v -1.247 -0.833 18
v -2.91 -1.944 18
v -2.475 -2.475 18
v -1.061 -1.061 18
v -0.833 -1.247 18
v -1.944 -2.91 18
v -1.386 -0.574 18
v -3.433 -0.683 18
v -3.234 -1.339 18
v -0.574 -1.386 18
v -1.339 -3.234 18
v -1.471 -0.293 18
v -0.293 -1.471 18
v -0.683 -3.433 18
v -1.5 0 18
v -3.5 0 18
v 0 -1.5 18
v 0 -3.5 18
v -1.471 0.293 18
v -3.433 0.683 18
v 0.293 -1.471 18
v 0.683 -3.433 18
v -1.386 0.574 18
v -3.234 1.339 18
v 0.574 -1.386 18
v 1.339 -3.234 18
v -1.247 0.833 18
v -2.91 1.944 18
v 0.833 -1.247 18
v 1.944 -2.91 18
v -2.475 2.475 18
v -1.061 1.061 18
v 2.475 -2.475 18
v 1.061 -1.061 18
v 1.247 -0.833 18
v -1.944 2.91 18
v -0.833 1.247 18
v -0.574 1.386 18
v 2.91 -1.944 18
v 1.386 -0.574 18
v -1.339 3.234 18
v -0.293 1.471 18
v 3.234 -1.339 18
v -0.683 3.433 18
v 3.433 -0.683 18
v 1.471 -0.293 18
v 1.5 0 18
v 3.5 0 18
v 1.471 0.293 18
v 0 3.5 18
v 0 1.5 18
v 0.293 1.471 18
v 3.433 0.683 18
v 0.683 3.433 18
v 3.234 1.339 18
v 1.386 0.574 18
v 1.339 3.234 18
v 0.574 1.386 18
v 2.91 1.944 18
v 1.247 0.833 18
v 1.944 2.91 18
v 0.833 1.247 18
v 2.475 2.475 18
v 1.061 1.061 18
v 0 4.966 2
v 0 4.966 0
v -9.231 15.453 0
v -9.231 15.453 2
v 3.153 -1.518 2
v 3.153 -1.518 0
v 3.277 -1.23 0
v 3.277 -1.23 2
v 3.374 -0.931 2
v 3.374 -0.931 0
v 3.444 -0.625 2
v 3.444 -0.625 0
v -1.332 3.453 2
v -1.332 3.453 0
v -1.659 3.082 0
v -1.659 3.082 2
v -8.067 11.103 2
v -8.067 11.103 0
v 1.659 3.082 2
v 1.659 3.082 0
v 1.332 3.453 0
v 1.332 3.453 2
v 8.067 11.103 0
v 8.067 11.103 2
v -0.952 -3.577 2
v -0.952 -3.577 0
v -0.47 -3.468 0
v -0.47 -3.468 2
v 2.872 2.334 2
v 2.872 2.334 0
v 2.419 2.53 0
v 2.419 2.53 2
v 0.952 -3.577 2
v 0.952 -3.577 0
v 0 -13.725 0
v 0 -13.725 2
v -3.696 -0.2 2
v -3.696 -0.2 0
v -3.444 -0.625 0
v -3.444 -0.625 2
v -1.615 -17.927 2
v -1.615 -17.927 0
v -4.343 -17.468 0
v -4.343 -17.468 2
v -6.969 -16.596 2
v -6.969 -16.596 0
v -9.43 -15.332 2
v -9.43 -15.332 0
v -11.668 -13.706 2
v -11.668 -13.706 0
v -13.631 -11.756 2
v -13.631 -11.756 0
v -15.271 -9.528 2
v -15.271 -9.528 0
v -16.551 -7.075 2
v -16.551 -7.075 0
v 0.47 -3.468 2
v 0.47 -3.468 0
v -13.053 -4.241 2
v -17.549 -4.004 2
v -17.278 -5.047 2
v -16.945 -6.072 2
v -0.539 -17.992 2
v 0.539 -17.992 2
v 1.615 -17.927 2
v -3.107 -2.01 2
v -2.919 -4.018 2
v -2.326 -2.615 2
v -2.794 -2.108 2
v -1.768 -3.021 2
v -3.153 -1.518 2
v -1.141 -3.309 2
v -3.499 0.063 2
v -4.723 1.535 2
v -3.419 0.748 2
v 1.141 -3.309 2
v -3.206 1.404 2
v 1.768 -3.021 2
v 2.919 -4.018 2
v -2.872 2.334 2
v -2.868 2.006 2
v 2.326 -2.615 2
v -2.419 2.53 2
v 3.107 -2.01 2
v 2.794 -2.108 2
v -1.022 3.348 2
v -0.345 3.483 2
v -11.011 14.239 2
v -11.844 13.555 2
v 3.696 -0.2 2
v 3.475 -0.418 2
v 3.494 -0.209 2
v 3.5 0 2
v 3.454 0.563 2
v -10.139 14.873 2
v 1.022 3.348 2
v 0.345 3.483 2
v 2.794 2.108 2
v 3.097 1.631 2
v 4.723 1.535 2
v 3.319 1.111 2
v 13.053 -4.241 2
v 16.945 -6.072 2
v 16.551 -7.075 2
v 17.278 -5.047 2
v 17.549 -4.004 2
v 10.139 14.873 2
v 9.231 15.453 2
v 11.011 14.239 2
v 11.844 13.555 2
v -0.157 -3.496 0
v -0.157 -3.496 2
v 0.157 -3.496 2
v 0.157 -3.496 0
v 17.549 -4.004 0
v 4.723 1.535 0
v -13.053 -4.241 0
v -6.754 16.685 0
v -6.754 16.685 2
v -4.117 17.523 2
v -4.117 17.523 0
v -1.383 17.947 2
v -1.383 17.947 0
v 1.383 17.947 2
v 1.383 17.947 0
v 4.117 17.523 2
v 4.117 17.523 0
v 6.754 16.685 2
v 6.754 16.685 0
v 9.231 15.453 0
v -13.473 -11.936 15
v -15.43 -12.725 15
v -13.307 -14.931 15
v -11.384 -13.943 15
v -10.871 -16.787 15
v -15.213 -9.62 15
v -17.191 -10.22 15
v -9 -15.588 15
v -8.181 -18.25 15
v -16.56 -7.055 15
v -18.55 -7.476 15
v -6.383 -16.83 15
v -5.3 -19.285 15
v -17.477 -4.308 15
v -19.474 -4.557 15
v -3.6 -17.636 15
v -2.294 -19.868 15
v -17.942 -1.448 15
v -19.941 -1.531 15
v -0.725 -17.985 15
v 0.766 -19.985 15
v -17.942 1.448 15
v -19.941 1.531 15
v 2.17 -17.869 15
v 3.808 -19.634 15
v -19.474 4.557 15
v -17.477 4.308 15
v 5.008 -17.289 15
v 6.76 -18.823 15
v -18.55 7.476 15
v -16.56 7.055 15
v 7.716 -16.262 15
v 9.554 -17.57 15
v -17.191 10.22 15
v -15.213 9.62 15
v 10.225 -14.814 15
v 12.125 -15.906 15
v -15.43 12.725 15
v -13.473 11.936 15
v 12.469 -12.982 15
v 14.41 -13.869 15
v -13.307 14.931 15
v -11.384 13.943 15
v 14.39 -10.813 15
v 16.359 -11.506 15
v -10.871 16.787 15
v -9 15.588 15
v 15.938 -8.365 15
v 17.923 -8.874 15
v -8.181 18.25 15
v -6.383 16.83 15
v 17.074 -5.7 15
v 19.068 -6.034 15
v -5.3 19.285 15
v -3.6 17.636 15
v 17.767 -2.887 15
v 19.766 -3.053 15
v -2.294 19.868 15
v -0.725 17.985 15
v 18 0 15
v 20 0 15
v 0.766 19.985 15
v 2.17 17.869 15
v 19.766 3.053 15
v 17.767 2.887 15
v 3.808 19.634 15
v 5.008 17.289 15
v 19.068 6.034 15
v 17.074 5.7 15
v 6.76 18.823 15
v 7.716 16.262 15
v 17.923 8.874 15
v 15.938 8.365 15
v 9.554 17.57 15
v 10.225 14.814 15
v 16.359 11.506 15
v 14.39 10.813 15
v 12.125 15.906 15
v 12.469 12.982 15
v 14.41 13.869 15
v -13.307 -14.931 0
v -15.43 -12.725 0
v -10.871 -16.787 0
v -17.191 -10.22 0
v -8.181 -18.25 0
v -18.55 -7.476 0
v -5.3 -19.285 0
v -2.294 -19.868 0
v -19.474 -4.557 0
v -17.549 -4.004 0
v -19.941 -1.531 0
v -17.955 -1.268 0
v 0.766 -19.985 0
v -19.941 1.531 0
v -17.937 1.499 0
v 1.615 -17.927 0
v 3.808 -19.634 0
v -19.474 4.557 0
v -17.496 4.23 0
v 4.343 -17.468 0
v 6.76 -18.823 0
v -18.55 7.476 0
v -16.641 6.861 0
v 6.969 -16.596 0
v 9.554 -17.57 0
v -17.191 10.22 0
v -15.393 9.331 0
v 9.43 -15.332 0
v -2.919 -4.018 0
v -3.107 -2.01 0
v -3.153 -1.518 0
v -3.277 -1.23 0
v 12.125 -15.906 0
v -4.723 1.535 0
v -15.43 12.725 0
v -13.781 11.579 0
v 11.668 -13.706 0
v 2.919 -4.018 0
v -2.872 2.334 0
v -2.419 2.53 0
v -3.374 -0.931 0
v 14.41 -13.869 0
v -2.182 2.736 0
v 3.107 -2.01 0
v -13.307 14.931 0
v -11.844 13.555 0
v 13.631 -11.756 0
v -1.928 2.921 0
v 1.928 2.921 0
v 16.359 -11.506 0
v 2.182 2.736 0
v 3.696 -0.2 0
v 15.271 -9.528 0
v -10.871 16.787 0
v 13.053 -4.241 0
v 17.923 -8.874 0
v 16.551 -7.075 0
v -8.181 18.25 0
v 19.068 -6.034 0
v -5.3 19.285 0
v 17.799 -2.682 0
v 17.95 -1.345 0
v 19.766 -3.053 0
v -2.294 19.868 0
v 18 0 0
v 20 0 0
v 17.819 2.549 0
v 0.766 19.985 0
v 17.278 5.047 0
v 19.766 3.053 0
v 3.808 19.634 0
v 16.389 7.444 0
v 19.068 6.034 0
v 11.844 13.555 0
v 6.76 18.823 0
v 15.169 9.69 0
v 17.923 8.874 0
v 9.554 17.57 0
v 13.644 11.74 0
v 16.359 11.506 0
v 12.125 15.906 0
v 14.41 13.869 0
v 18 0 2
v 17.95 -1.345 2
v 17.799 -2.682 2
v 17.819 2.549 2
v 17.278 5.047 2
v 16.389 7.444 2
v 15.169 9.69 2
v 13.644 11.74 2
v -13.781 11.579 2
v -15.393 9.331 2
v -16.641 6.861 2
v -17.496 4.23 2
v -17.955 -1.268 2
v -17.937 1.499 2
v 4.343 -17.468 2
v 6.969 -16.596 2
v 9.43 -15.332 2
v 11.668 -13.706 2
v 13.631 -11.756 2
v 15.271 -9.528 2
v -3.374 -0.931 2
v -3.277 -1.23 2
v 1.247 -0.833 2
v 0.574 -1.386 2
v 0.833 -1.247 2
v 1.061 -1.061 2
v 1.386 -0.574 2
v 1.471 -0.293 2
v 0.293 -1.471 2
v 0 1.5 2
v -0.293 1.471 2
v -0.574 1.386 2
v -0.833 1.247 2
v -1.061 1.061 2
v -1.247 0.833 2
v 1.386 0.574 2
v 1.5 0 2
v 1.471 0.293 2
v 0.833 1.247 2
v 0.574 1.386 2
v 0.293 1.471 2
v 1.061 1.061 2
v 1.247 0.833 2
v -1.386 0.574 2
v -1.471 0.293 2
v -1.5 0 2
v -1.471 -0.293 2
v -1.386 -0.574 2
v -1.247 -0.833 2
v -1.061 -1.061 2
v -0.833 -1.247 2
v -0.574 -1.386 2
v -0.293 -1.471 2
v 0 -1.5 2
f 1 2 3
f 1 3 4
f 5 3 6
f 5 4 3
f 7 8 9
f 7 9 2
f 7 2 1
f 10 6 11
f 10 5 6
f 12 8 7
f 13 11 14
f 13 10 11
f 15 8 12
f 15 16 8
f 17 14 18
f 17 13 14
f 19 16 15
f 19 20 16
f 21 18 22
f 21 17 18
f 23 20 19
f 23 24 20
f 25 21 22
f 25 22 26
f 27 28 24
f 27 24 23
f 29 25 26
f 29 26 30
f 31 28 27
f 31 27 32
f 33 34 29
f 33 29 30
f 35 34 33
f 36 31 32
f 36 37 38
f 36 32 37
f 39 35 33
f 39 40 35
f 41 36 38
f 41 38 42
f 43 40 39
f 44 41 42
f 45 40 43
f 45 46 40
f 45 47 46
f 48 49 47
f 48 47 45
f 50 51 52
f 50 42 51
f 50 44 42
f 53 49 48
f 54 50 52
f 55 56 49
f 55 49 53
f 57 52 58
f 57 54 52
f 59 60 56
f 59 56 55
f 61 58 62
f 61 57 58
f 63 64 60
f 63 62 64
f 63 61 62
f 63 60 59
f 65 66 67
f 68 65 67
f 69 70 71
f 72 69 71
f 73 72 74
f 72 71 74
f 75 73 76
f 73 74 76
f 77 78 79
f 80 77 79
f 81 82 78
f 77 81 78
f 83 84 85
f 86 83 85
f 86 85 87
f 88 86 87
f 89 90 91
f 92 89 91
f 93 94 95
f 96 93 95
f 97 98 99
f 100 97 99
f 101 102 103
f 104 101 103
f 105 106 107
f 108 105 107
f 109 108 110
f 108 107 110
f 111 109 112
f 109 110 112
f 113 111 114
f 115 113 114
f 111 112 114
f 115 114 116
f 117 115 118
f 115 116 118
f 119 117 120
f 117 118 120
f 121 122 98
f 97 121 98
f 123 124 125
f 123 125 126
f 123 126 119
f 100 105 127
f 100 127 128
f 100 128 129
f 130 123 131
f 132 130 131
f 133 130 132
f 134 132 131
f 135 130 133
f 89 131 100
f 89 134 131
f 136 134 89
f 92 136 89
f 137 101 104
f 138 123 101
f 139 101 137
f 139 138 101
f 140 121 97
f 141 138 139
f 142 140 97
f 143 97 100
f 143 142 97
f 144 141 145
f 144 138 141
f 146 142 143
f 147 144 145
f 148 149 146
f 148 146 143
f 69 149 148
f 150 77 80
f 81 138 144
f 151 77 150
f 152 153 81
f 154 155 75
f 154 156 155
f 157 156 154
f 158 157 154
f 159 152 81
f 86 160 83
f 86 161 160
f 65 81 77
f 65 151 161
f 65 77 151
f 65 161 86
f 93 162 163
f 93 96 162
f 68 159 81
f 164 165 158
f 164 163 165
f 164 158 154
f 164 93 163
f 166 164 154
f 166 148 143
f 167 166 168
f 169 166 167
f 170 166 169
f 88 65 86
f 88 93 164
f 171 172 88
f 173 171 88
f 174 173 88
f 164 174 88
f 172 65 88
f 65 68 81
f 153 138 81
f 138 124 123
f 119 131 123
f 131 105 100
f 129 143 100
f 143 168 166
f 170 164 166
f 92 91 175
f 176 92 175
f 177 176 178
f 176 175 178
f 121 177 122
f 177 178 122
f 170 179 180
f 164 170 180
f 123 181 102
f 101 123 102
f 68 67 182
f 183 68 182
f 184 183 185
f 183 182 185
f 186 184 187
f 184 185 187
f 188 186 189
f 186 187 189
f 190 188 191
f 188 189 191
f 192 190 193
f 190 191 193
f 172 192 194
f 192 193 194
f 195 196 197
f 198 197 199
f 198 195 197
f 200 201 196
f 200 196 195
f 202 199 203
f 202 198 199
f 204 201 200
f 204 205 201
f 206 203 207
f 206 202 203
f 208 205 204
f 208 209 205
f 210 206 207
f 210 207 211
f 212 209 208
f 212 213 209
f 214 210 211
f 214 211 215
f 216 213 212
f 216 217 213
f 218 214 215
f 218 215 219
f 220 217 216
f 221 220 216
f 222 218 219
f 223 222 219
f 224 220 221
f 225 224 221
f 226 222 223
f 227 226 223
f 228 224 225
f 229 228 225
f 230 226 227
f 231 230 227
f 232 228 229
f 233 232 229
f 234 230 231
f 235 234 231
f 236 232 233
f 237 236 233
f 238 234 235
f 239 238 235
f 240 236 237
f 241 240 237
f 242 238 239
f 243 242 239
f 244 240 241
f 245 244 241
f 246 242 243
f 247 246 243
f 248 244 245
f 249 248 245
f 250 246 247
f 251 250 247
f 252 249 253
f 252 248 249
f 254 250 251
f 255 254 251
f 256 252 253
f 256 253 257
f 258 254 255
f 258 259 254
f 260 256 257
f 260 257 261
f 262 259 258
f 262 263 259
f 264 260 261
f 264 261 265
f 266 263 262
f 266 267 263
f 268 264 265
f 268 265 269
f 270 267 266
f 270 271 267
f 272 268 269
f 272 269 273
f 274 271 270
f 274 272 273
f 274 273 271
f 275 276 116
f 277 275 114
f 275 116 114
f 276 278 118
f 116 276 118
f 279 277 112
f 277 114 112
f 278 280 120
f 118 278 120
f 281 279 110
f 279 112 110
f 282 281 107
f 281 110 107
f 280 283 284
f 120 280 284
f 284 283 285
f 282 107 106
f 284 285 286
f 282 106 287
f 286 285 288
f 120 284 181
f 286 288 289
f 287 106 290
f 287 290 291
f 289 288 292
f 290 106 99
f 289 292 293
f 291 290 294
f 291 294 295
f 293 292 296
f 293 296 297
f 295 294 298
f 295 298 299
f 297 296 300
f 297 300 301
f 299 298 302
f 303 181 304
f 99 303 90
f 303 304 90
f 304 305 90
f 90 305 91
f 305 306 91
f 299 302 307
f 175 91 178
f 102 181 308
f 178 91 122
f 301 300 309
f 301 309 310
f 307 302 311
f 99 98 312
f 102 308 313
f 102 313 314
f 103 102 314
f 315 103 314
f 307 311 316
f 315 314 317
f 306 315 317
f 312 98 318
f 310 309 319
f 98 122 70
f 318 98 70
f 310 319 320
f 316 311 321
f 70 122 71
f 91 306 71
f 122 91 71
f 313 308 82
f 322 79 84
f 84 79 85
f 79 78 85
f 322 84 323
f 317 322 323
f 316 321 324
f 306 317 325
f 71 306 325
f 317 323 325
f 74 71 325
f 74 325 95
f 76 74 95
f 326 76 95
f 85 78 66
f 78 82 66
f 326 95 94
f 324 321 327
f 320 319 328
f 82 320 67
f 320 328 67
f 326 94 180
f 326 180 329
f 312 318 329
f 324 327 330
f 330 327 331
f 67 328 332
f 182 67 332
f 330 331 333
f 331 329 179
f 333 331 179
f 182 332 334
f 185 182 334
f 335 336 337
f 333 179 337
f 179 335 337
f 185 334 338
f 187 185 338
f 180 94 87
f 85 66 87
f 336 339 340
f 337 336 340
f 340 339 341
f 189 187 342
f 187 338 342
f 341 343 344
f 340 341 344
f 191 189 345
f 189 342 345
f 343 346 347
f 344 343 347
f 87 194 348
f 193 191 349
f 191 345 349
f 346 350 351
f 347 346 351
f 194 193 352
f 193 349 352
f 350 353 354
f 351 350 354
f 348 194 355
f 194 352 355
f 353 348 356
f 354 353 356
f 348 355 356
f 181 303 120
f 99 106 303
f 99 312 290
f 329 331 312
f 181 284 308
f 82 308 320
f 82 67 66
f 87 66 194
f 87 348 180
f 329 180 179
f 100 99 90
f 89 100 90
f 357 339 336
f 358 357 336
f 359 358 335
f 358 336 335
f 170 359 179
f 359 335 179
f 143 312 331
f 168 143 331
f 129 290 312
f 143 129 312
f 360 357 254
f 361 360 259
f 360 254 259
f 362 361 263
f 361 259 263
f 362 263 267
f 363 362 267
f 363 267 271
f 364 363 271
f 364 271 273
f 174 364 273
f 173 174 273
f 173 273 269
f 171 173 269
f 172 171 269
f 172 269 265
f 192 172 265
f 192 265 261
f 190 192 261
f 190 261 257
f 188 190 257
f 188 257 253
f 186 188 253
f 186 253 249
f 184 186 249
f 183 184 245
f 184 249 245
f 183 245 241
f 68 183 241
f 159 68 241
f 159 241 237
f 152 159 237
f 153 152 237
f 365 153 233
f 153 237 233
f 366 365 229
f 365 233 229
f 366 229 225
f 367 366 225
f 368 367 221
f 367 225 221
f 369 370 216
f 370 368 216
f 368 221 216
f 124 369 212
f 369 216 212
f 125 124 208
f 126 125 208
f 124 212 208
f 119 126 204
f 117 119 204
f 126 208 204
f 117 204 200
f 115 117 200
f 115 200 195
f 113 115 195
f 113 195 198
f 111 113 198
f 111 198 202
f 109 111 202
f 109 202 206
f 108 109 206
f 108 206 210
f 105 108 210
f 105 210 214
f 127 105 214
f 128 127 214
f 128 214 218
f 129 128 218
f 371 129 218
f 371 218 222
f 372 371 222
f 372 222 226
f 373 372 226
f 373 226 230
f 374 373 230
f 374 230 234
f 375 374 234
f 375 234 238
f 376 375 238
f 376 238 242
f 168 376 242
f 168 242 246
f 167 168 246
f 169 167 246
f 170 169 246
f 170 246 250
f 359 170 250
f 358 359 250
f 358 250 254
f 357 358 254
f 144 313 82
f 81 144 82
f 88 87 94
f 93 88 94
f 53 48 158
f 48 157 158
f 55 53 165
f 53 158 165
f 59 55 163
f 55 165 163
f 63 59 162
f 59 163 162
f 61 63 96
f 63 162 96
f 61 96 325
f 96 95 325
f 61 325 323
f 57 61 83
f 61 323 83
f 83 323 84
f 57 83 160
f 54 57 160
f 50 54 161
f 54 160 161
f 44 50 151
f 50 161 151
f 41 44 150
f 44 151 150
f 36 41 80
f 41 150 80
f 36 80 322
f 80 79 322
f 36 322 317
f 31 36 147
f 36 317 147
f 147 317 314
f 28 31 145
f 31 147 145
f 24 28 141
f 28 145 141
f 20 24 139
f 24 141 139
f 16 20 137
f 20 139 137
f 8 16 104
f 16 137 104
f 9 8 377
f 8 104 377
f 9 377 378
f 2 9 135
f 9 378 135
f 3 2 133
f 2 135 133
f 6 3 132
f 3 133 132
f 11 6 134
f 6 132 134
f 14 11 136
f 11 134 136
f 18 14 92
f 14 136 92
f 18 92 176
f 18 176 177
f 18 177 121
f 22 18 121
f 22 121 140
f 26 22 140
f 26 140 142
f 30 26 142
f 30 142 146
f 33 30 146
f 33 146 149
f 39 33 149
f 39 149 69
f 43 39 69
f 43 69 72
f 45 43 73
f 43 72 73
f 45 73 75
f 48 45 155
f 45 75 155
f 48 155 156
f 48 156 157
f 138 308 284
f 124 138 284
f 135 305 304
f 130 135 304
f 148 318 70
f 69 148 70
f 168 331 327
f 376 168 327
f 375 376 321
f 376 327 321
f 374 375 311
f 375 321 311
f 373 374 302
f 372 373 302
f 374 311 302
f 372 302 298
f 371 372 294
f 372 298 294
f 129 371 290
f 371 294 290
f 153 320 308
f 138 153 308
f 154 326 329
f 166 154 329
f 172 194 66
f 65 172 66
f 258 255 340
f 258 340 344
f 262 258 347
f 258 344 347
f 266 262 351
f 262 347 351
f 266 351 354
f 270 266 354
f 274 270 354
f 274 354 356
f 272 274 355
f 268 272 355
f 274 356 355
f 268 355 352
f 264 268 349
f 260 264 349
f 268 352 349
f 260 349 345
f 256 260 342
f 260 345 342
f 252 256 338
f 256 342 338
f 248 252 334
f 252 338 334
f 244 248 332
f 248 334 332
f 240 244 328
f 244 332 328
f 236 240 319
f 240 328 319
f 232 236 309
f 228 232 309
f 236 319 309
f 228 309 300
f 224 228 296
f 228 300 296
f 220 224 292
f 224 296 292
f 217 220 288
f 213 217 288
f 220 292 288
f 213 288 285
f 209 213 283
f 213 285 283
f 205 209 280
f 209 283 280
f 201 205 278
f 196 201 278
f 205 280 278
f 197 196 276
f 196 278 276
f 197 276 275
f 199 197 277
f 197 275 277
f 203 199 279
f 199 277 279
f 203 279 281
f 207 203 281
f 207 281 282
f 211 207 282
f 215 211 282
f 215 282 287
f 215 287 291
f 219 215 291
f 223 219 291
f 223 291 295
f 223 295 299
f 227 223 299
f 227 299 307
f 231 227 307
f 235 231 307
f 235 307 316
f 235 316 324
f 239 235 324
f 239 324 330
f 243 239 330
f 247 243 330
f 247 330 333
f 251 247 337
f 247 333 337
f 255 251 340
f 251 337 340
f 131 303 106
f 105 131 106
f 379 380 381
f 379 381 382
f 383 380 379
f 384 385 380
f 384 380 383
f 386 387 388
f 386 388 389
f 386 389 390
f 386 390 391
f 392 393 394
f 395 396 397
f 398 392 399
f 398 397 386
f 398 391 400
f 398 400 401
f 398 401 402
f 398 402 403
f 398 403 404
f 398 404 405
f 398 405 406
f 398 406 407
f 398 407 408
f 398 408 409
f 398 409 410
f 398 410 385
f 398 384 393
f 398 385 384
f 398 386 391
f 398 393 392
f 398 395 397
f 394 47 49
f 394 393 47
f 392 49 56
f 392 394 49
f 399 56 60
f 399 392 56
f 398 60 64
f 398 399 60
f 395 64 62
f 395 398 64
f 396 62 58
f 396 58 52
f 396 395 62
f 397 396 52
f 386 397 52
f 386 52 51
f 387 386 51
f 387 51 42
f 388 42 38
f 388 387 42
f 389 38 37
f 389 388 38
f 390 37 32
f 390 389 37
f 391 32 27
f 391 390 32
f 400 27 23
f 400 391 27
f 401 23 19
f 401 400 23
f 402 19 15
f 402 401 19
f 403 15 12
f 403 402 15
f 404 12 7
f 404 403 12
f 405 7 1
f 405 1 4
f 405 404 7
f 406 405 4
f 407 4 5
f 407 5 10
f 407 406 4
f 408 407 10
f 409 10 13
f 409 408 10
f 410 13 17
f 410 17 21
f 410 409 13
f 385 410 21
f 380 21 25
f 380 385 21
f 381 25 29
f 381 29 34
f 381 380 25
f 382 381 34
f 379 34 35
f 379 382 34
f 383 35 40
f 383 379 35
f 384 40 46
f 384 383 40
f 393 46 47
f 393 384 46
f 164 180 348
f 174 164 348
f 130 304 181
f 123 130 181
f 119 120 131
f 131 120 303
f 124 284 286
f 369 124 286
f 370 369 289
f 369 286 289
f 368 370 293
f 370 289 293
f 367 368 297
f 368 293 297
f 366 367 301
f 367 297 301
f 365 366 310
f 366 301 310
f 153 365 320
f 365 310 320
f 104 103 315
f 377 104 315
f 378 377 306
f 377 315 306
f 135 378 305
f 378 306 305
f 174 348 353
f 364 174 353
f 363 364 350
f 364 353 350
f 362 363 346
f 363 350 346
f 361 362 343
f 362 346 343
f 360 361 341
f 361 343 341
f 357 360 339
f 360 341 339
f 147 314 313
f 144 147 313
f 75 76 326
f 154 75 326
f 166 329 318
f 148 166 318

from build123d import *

# Parameters (mm, degrees)
F0_R      = 20
F1_DEPTH  = 15
F2_R      = 18
F3_DEPTH  = 13
F4_R      = 3.5
F4_R_2    = 1.5
F5_DEPTH  = 13
F6_R      = 3.5
F6_R_2    = 1.5
F7_DEPTH  = 3
F10_DEPTH = 2


with BuildPart() as f1:
    # F0 (on Top) → F1 (new body)
    with BuildSketch(Plane.XY):
        Circle(F0_R)
    extrude(amount=F1_DEPTH)

    # F2 (on face) → F3 (cut)
    with BuildSketch(Plane.XY.offset(15)):
        Circle(F2_R)
    extrude(amount=-F3_DEPTH, mode=Mode.SUBTRACT)

    # F4 (on face) → F5 (join)
    with BuildSketch(Plane.XY.offset(15)):
        Circle(F4_R)
        Circle(F4_R_2, mode=Mode.SUBTRACT)
    extrude(amount=-F5_DEPTH)

    # F6 (on face) → F7 (join)
    with BuildSketch(Plane.XY.offset(15)):
        Circle(F6_R)
        Circle(F6_R_2, mode=Mode.SUBTRACT)
    extrude(amount=F7_DEPTH)

    # F9 (on face) → F10 (cut)
    with BuildSketch(Plane(origin=(0, 0, 0), x_dir=(1, 0, 0), z_dir=(0, 0, -1))):
        with BuildLine():
            Line((-2.9190978863, 4.0177935548), (-1.6146279111, 17.9274364232))
            ThreePointArc((-1.6146279111, 17.9274364232), (-10.5801345413, 14.5623058987), (-16.5510577667, 7.0754849166))
            Line((-16.5510577667, 7.0754849166), (-2.9190978863, 4.0177935548))
        make_face()
        with BuildLine():
            ThreePointArc((-17.5489526949, 4.0042801241), (-17.1190172933, -5.5623058987), (-11.8437441606, -13.5545462579))
            Line((-11.8437441606, -13.5545462579), (-4.7231995965, -1.5346605781))
            Line((-4.7231995965, -1.5346605781), (-17.5489526949, 4.0042801241))
        make_face()
        with BuildLine():
            ThreePointArc((-9.2312213213, -15.452655206), (0, -18), (9.2312213213, -15.452655206))
            Line((9.2312213213, -15.452655206), (0, -4.9662659533))
            Line((0, -4.9662659533), (-9.2312213213, -15.452655206))
        make_face()
        with BuildLine():
            ThreePointArc((11.8437441606, -13.5545462579), (16.3888284342, -7.4435409957), (18, 0))
            ThreePointArc((18, 0), (17.8868827428, 2.0148016642), (17.5489526949, 4.0042801241))
            Line((17.5489526949, 4.0042801241), (4.7231995965, -1.5346605781))
            Line((4.7231995965, -1.5346605781), (11.8437441606, -13.5545462579))
        make_face()
        with BuildLine():
            Line((2.9190978863, 4.0177935548), (16.5510577667, 7.0754849166))
            ThreePointArc((16.5510577667, 7.0754849166), (10.5801345413, 14.5623058987), (1.6146279111, 17.9274364232))
            Line((1.6146279111, 17.9274364232), (2.9190978863, 4.0177935548))
        make_face()
        with BuildLine():
            Line((-1.3322676027, -3.4528501024), (-1.6587573928, -3.0819675391))
            ThreePointArc((-1.6587573928, -3.0819675391), (-2.057248383, -2.8315594803), (-2.4185410871, -2.5299523731))
            Line((-2.4185410871, -2.5299523731), (-2.8721622593, -2.3340511457))
            Line((-2.8721622593, -2.3340511457), (-8.0671256706, -11.1034459232))
            Line((-8.0671256706, -11.1034459232), (-1.3322676027, -3.4528501024))
        make_face()
        with BuildLine():
            Line((2.8721622593, -2.3340511457), (2.4185410871, -2.5299523731))
            ThreePointArc((2.4185410871, -2.5299523731), (2.057248383, -2.8315594803), (1.6587573928, -3.0819675391))
            Line((1.6587573928, -3.0819675391), (1.3322676027, -3.4528501024))
            Line((1.3322676027, -3.4528501024), (8.0671256706, -11.1034459232))
            Line((8.0671256706, -11.1034459232), (2.8721622593, -2.3340511457))
        make_face()
        with BuildLine():
            ThreePointArc((3.1534979878, 1.5183709826), (3.328697807, 1.0815594803), (3.443709535, 0.6251916817))
            Line((3.443709535, 0.6251916817), (3.6955489199, 0.2000724244))
            Line((3.6955489199, 0.2000724244), (13.0528835265, 4.2411389504))
            Line((13.0528835265, 4.2411389504), (3.1073615002, 2.0103271628))
            Line((3.1073615002, 2.0103271628), (3.1534979878, 1.5183709826))
        make_face()
        with BuildLine():
            ThreePointArc((-0.4695721472, 3.4683572478), (0, 3.5), (0.4695721472, 3.4683572478))
            Line((0.4695721472, 3.4683572478), (0.9517072369, 3.5765016608))
            Line((0.9517072369, 3.5765016608), (0, 13.7246139455))
            Line((0, 13.7246139455), (-0.9517072369, 3.5765016608))
            Line((-0.9517072369, 3.5765016608), (-0.4695721472, 3.4683572478))
        make_face()
        with BuildLine():
            ThreePointArc((-3.443709535, 0.6251916817), (-3.328697807, 1.0815594803), (-3.1534979878, 1.5183709826))
            Line((-3.1534979878, 1.5183709826), (-3.1073615002, 2.0103271628))
            Line((-3.1073615002, 2.0103271628), (-13.0528835265, 4.2411389504))
            Line((-13.0528835265, 4.2411389504), (-3.6955489199, 0.2000724244))
            Line((-3.6955489199, 0.2000724244), (-3.443709535, 0.6251916817))
        make_face()
    extrude(amount=-F10_DEPTH, mode=Mode.SUBTRACT)


solid = f1.part
